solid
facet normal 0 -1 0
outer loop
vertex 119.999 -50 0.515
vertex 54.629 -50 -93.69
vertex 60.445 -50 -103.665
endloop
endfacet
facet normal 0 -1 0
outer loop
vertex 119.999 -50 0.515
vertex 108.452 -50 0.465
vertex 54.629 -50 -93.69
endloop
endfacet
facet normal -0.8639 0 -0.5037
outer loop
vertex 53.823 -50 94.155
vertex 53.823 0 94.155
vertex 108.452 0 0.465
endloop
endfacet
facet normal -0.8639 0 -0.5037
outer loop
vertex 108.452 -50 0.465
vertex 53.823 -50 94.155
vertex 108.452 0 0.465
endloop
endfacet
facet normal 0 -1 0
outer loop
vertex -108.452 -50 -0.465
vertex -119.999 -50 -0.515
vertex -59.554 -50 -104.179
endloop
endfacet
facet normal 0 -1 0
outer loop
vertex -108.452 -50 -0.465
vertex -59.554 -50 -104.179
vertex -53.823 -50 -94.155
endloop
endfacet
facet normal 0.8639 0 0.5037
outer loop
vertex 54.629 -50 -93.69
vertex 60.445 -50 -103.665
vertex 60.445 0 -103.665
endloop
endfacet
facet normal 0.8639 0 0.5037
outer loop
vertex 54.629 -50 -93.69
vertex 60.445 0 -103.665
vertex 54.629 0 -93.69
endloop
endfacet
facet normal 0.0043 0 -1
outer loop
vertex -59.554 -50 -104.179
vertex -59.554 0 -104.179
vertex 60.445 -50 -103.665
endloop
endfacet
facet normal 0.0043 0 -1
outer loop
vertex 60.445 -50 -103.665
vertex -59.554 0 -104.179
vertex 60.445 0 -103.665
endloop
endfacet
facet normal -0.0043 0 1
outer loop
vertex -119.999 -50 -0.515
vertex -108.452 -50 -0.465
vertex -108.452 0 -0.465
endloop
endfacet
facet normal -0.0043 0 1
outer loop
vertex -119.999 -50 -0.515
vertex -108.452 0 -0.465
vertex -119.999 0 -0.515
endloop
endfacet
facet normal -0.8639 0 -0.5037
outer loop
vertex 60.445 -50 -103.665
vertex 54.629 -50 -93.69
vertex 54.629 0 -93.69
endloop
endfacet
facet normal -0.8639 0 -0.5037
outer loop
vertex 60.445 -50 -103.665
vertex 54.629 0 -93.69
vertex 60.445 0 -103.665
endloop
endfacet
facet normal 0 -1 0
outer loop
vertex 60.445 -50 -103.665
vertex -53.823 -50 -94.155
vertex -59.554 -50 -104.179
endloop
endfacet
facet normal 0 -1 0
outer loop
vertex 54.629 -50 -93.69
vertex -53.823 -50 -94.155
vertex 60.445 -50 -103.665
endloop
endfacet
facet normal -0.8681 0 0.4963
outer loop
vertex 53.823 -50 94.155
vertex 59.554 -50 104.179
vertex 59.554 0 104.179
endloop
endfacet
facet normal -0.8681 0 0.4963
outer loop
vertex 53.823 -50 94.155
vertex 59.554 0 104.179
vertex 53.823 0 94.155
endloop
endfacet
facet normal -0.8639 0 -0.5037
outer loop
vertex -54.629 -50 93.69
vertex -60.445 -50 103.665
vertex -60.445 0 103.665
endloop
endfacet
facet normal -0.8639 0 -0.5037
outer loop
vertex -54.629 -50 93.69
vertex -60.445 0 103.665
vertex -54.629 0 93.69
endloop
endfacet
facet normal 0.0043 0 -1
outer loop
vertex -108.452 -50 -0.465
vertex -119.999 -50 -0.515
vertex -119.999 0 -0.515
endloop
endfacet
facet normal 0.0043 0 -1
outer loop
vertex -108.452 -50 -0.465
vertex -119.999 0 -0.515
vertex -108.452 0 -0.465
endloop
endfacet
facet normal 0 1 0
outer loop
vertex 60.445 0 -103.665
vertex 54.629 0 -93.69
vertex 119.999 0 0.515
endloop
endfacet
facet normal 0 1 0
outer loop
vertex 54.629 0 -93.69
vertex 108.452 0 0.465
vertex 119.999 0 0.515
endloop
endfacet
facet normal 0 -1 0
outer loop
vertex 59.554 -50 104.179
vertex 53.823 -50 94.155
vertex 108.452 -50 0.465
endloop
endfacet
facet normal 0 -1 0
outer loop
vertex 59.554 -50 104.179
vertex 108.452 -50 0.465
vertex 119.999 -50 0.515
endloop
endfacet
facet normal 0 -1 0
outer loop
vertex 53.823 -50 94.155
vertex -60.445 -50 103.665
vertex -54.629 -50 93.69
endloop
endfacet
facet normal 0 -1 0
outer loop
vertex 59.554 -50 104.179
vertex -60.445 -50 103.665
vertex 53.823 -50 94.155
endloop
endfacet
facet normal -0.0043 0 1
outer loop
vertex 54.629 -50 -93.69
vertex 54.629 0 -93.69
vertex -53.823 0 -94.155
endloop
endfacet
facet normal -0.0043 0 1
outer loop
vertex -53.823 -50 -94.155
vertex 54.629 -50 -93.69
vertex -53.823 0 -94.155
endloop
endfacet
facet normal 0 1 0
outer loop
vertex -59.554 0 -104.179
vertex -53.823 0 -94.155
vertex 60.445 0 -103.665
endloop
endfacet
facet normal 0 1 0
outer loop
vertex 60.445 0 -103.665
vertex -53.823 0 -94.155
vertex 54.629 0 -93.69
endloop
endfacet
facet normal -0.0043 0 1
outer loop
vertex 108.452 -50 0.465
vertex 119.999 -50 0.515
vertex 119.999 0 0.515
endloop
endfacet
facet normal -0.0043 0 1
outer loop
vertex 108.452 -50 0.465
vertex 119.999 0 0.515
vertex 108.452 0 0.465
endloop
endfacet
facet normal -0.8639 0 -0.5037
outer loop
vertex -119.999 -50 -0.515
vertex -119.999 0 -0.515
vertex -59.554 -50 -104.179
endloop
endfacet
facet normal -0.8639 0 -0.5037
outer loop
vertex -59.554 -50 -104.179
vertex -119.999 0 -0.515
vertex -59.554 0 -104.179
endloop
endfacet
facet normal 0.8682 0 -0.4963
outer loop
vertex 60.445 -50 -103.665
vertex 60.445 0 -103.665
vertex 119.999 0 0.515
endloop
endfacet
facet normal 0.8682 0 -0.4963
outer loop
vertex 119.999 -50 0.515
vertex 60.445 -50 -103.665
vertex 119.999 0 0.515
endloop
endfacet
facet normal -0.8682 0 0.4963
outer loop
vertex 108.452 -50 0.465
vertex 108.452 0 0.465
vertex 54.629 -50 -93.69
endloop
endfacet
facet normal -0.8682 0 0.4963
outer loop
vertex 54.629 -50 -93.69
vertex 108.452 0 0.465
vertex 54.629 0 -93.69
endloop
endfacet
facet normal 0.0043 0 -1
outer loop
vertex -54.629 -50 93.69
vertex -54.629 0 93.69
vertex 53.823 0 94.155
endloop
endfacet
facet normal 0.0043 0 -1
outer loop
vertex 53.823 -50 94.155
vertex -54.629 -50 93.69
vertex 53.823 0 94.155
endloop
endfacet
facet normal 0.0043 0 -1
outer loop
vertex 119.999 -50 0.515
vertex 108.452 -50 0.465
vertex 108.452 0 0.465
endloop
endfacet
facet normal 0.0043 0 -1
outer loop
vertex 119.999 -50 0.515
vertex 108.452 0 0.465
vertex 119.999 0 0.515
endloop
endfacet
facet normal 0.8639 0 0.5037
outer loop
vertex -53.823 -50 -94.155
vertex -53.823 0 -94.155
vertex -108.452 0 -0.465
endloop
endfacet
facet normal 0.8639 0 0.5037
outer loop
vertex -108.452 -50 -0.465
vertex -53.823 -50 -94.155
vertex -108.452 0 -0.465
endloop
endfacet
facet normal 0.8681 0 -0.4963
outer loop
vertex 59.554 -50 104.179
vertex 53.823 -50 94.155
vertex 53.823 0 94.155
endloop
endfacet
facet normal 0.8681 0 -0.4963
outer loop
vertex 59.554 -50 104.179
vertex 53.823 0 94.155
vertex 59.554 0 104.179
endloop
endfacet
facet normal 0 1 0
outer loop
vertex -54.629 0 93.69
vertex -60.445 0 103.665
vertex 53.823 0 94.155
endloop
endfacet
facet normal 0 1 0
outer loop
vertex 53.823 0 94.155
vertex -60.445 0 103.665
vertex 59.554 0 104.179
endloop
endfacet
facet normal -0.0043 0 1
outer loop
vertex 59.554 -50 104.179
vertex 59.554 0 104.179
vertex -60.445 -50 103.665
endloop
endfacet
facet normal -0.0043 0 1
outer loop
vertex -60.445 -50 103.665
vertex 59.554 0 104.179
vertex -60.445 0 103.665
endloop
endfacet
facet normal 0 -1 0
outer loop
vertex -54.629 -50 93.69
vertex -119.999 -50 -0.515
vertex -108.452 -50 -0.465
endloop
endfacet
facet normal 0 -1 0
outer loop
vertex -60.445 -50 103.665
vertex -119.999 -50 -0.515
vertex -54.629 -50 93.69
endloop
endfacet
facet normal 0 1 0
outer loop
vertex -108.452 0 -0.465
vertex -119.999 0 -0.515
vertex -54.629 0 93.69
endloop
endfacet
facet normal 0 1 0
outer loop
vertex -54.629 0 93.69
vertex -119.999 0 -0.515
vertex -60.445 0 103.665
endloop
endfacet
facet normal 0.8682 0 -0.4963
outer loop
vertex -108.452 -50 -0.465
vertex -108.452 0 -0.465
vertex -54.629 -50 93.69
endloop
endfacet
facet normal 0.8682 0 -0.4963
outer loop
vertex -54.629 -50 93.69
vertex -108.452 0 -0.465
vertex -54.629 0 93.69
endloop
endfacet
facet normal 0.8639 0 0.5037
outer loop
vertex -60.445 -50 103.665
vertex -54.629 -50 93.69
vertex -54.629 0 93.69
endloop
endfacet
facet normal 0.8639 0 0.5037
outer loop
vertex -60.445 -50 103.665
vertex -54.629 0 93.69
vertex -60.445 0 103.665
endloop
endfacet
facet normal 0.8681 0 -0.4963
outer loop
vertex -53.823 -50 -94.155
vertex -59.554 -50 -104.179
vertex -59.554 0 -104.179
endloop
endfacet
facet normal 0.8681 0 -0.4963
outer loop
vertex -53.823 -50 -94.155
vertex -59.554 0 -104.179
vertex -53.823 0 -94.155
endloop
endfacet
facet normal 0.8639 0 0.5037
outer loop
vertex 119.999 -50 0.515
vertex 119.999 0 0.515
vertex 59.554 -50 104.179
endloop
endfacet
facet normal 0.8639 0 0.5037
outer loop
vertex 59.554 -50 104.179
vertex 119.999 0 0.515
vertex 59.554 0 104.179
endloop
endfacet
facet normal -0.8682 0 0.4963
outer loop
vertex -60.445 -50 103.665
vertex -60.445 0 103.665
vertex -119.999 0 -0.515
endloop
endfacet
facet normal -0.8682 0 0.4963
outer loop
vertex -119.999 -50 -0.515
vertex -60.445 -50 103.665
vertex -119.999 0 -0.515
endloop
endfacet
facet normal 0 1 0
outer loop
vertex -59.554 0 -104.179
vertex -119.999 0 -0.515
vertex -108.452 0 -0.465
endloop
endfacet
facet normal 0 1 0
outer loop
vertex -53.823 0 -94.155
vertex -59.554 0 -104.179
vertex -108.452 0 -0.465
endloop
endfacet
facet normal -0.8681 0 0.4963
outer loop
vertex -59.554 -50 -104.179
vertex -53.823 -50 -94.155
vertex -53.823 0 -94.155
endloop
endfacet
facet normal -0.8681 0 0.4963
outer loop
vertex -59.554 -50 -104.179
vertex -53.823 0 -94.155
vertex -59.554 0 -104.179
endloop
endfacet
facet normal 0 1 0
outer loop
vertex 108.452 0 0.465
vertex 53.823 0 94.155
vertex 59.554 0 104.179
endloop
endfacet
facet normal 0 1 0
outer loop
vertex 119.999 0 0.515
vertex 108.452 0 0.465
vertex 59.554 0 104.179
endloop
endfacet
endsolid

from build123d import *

# Parameters (mm, degrees)
F1_DEPTH = 50
F2_DEPTH = 50
F3_DEPTH = 50
F4_DEPTH = 50
F5_DEPTH = 50
F6_DEPTH = 50


with BuildPart() as f1:
    # F0 (on Front) → F1 (new body)
    with BuildSketch(Plane.XZ):
        Polygon((59.553777, 104.179401), (-60.44512, 103.664784), (-54.628786, 93.689636), (53.823212, 94.154734), align=None)
    extrude(amount=F1_DEPTH)


with BuildPart() as f2:
    # F0 (on Front) → F2 (new body)
    with BuildSketch(Plane.XZ):
        Polygon((-60.44512, 103.664784), (-119.998897, -0.514617), (-108.451997, -0.465098), (-54.628786, 93.689636), align=None)
    extrude(amount=F2_DEPTH)


with BuildPart() as f3:
    # F0 (on Front) → F3 (new body)
    with BuildSketch(Plane.XZ):
        Polygon((-108.451997, -0.465098), (-119.998897, -0.514617), (-59.553777, -104.179401), (-53.823212, -94.154734), align=None)
    extrude(amount=F3_DEPTH)


with BuildPart() as f4:
    # F0 (on Front) → F4 (new body)
    with BuildSketch(Plane.XZ):
        Polygon((-53.823212, -94.154734), (-59.553777, -104.179401), (60.44512, -103.664784), (54.628786, -93.689636), align=None)
    extrude(amount=F4_DEPTH)


with BuildPart() as f5:
    # F0 (on Front) → F5 (new body)
    with BuildSketch(Plane.XZ):
        Polygon((54.628786, -93.689636), (60.44512, -103.664784), (119.998897, 0.514617), (108.451997, 0.465098), align=None)
    extrude(amount=F5_DEPTH)


with BuildPart() as f6:
    # F0 (on Front) → F6 (new body)
    with BuildSketch(Plane.XZ):
        Polygon((119.998897, 0.514617), (59.553777, 104.179401), (53.823212, 94.154734), (108.451997, 0.465098), align=None)
    extrude(amount=F6_DEPTH)


solid = Compound([f1.part, f2.part, f3.part, f4.part, f5.part, f6.part])
